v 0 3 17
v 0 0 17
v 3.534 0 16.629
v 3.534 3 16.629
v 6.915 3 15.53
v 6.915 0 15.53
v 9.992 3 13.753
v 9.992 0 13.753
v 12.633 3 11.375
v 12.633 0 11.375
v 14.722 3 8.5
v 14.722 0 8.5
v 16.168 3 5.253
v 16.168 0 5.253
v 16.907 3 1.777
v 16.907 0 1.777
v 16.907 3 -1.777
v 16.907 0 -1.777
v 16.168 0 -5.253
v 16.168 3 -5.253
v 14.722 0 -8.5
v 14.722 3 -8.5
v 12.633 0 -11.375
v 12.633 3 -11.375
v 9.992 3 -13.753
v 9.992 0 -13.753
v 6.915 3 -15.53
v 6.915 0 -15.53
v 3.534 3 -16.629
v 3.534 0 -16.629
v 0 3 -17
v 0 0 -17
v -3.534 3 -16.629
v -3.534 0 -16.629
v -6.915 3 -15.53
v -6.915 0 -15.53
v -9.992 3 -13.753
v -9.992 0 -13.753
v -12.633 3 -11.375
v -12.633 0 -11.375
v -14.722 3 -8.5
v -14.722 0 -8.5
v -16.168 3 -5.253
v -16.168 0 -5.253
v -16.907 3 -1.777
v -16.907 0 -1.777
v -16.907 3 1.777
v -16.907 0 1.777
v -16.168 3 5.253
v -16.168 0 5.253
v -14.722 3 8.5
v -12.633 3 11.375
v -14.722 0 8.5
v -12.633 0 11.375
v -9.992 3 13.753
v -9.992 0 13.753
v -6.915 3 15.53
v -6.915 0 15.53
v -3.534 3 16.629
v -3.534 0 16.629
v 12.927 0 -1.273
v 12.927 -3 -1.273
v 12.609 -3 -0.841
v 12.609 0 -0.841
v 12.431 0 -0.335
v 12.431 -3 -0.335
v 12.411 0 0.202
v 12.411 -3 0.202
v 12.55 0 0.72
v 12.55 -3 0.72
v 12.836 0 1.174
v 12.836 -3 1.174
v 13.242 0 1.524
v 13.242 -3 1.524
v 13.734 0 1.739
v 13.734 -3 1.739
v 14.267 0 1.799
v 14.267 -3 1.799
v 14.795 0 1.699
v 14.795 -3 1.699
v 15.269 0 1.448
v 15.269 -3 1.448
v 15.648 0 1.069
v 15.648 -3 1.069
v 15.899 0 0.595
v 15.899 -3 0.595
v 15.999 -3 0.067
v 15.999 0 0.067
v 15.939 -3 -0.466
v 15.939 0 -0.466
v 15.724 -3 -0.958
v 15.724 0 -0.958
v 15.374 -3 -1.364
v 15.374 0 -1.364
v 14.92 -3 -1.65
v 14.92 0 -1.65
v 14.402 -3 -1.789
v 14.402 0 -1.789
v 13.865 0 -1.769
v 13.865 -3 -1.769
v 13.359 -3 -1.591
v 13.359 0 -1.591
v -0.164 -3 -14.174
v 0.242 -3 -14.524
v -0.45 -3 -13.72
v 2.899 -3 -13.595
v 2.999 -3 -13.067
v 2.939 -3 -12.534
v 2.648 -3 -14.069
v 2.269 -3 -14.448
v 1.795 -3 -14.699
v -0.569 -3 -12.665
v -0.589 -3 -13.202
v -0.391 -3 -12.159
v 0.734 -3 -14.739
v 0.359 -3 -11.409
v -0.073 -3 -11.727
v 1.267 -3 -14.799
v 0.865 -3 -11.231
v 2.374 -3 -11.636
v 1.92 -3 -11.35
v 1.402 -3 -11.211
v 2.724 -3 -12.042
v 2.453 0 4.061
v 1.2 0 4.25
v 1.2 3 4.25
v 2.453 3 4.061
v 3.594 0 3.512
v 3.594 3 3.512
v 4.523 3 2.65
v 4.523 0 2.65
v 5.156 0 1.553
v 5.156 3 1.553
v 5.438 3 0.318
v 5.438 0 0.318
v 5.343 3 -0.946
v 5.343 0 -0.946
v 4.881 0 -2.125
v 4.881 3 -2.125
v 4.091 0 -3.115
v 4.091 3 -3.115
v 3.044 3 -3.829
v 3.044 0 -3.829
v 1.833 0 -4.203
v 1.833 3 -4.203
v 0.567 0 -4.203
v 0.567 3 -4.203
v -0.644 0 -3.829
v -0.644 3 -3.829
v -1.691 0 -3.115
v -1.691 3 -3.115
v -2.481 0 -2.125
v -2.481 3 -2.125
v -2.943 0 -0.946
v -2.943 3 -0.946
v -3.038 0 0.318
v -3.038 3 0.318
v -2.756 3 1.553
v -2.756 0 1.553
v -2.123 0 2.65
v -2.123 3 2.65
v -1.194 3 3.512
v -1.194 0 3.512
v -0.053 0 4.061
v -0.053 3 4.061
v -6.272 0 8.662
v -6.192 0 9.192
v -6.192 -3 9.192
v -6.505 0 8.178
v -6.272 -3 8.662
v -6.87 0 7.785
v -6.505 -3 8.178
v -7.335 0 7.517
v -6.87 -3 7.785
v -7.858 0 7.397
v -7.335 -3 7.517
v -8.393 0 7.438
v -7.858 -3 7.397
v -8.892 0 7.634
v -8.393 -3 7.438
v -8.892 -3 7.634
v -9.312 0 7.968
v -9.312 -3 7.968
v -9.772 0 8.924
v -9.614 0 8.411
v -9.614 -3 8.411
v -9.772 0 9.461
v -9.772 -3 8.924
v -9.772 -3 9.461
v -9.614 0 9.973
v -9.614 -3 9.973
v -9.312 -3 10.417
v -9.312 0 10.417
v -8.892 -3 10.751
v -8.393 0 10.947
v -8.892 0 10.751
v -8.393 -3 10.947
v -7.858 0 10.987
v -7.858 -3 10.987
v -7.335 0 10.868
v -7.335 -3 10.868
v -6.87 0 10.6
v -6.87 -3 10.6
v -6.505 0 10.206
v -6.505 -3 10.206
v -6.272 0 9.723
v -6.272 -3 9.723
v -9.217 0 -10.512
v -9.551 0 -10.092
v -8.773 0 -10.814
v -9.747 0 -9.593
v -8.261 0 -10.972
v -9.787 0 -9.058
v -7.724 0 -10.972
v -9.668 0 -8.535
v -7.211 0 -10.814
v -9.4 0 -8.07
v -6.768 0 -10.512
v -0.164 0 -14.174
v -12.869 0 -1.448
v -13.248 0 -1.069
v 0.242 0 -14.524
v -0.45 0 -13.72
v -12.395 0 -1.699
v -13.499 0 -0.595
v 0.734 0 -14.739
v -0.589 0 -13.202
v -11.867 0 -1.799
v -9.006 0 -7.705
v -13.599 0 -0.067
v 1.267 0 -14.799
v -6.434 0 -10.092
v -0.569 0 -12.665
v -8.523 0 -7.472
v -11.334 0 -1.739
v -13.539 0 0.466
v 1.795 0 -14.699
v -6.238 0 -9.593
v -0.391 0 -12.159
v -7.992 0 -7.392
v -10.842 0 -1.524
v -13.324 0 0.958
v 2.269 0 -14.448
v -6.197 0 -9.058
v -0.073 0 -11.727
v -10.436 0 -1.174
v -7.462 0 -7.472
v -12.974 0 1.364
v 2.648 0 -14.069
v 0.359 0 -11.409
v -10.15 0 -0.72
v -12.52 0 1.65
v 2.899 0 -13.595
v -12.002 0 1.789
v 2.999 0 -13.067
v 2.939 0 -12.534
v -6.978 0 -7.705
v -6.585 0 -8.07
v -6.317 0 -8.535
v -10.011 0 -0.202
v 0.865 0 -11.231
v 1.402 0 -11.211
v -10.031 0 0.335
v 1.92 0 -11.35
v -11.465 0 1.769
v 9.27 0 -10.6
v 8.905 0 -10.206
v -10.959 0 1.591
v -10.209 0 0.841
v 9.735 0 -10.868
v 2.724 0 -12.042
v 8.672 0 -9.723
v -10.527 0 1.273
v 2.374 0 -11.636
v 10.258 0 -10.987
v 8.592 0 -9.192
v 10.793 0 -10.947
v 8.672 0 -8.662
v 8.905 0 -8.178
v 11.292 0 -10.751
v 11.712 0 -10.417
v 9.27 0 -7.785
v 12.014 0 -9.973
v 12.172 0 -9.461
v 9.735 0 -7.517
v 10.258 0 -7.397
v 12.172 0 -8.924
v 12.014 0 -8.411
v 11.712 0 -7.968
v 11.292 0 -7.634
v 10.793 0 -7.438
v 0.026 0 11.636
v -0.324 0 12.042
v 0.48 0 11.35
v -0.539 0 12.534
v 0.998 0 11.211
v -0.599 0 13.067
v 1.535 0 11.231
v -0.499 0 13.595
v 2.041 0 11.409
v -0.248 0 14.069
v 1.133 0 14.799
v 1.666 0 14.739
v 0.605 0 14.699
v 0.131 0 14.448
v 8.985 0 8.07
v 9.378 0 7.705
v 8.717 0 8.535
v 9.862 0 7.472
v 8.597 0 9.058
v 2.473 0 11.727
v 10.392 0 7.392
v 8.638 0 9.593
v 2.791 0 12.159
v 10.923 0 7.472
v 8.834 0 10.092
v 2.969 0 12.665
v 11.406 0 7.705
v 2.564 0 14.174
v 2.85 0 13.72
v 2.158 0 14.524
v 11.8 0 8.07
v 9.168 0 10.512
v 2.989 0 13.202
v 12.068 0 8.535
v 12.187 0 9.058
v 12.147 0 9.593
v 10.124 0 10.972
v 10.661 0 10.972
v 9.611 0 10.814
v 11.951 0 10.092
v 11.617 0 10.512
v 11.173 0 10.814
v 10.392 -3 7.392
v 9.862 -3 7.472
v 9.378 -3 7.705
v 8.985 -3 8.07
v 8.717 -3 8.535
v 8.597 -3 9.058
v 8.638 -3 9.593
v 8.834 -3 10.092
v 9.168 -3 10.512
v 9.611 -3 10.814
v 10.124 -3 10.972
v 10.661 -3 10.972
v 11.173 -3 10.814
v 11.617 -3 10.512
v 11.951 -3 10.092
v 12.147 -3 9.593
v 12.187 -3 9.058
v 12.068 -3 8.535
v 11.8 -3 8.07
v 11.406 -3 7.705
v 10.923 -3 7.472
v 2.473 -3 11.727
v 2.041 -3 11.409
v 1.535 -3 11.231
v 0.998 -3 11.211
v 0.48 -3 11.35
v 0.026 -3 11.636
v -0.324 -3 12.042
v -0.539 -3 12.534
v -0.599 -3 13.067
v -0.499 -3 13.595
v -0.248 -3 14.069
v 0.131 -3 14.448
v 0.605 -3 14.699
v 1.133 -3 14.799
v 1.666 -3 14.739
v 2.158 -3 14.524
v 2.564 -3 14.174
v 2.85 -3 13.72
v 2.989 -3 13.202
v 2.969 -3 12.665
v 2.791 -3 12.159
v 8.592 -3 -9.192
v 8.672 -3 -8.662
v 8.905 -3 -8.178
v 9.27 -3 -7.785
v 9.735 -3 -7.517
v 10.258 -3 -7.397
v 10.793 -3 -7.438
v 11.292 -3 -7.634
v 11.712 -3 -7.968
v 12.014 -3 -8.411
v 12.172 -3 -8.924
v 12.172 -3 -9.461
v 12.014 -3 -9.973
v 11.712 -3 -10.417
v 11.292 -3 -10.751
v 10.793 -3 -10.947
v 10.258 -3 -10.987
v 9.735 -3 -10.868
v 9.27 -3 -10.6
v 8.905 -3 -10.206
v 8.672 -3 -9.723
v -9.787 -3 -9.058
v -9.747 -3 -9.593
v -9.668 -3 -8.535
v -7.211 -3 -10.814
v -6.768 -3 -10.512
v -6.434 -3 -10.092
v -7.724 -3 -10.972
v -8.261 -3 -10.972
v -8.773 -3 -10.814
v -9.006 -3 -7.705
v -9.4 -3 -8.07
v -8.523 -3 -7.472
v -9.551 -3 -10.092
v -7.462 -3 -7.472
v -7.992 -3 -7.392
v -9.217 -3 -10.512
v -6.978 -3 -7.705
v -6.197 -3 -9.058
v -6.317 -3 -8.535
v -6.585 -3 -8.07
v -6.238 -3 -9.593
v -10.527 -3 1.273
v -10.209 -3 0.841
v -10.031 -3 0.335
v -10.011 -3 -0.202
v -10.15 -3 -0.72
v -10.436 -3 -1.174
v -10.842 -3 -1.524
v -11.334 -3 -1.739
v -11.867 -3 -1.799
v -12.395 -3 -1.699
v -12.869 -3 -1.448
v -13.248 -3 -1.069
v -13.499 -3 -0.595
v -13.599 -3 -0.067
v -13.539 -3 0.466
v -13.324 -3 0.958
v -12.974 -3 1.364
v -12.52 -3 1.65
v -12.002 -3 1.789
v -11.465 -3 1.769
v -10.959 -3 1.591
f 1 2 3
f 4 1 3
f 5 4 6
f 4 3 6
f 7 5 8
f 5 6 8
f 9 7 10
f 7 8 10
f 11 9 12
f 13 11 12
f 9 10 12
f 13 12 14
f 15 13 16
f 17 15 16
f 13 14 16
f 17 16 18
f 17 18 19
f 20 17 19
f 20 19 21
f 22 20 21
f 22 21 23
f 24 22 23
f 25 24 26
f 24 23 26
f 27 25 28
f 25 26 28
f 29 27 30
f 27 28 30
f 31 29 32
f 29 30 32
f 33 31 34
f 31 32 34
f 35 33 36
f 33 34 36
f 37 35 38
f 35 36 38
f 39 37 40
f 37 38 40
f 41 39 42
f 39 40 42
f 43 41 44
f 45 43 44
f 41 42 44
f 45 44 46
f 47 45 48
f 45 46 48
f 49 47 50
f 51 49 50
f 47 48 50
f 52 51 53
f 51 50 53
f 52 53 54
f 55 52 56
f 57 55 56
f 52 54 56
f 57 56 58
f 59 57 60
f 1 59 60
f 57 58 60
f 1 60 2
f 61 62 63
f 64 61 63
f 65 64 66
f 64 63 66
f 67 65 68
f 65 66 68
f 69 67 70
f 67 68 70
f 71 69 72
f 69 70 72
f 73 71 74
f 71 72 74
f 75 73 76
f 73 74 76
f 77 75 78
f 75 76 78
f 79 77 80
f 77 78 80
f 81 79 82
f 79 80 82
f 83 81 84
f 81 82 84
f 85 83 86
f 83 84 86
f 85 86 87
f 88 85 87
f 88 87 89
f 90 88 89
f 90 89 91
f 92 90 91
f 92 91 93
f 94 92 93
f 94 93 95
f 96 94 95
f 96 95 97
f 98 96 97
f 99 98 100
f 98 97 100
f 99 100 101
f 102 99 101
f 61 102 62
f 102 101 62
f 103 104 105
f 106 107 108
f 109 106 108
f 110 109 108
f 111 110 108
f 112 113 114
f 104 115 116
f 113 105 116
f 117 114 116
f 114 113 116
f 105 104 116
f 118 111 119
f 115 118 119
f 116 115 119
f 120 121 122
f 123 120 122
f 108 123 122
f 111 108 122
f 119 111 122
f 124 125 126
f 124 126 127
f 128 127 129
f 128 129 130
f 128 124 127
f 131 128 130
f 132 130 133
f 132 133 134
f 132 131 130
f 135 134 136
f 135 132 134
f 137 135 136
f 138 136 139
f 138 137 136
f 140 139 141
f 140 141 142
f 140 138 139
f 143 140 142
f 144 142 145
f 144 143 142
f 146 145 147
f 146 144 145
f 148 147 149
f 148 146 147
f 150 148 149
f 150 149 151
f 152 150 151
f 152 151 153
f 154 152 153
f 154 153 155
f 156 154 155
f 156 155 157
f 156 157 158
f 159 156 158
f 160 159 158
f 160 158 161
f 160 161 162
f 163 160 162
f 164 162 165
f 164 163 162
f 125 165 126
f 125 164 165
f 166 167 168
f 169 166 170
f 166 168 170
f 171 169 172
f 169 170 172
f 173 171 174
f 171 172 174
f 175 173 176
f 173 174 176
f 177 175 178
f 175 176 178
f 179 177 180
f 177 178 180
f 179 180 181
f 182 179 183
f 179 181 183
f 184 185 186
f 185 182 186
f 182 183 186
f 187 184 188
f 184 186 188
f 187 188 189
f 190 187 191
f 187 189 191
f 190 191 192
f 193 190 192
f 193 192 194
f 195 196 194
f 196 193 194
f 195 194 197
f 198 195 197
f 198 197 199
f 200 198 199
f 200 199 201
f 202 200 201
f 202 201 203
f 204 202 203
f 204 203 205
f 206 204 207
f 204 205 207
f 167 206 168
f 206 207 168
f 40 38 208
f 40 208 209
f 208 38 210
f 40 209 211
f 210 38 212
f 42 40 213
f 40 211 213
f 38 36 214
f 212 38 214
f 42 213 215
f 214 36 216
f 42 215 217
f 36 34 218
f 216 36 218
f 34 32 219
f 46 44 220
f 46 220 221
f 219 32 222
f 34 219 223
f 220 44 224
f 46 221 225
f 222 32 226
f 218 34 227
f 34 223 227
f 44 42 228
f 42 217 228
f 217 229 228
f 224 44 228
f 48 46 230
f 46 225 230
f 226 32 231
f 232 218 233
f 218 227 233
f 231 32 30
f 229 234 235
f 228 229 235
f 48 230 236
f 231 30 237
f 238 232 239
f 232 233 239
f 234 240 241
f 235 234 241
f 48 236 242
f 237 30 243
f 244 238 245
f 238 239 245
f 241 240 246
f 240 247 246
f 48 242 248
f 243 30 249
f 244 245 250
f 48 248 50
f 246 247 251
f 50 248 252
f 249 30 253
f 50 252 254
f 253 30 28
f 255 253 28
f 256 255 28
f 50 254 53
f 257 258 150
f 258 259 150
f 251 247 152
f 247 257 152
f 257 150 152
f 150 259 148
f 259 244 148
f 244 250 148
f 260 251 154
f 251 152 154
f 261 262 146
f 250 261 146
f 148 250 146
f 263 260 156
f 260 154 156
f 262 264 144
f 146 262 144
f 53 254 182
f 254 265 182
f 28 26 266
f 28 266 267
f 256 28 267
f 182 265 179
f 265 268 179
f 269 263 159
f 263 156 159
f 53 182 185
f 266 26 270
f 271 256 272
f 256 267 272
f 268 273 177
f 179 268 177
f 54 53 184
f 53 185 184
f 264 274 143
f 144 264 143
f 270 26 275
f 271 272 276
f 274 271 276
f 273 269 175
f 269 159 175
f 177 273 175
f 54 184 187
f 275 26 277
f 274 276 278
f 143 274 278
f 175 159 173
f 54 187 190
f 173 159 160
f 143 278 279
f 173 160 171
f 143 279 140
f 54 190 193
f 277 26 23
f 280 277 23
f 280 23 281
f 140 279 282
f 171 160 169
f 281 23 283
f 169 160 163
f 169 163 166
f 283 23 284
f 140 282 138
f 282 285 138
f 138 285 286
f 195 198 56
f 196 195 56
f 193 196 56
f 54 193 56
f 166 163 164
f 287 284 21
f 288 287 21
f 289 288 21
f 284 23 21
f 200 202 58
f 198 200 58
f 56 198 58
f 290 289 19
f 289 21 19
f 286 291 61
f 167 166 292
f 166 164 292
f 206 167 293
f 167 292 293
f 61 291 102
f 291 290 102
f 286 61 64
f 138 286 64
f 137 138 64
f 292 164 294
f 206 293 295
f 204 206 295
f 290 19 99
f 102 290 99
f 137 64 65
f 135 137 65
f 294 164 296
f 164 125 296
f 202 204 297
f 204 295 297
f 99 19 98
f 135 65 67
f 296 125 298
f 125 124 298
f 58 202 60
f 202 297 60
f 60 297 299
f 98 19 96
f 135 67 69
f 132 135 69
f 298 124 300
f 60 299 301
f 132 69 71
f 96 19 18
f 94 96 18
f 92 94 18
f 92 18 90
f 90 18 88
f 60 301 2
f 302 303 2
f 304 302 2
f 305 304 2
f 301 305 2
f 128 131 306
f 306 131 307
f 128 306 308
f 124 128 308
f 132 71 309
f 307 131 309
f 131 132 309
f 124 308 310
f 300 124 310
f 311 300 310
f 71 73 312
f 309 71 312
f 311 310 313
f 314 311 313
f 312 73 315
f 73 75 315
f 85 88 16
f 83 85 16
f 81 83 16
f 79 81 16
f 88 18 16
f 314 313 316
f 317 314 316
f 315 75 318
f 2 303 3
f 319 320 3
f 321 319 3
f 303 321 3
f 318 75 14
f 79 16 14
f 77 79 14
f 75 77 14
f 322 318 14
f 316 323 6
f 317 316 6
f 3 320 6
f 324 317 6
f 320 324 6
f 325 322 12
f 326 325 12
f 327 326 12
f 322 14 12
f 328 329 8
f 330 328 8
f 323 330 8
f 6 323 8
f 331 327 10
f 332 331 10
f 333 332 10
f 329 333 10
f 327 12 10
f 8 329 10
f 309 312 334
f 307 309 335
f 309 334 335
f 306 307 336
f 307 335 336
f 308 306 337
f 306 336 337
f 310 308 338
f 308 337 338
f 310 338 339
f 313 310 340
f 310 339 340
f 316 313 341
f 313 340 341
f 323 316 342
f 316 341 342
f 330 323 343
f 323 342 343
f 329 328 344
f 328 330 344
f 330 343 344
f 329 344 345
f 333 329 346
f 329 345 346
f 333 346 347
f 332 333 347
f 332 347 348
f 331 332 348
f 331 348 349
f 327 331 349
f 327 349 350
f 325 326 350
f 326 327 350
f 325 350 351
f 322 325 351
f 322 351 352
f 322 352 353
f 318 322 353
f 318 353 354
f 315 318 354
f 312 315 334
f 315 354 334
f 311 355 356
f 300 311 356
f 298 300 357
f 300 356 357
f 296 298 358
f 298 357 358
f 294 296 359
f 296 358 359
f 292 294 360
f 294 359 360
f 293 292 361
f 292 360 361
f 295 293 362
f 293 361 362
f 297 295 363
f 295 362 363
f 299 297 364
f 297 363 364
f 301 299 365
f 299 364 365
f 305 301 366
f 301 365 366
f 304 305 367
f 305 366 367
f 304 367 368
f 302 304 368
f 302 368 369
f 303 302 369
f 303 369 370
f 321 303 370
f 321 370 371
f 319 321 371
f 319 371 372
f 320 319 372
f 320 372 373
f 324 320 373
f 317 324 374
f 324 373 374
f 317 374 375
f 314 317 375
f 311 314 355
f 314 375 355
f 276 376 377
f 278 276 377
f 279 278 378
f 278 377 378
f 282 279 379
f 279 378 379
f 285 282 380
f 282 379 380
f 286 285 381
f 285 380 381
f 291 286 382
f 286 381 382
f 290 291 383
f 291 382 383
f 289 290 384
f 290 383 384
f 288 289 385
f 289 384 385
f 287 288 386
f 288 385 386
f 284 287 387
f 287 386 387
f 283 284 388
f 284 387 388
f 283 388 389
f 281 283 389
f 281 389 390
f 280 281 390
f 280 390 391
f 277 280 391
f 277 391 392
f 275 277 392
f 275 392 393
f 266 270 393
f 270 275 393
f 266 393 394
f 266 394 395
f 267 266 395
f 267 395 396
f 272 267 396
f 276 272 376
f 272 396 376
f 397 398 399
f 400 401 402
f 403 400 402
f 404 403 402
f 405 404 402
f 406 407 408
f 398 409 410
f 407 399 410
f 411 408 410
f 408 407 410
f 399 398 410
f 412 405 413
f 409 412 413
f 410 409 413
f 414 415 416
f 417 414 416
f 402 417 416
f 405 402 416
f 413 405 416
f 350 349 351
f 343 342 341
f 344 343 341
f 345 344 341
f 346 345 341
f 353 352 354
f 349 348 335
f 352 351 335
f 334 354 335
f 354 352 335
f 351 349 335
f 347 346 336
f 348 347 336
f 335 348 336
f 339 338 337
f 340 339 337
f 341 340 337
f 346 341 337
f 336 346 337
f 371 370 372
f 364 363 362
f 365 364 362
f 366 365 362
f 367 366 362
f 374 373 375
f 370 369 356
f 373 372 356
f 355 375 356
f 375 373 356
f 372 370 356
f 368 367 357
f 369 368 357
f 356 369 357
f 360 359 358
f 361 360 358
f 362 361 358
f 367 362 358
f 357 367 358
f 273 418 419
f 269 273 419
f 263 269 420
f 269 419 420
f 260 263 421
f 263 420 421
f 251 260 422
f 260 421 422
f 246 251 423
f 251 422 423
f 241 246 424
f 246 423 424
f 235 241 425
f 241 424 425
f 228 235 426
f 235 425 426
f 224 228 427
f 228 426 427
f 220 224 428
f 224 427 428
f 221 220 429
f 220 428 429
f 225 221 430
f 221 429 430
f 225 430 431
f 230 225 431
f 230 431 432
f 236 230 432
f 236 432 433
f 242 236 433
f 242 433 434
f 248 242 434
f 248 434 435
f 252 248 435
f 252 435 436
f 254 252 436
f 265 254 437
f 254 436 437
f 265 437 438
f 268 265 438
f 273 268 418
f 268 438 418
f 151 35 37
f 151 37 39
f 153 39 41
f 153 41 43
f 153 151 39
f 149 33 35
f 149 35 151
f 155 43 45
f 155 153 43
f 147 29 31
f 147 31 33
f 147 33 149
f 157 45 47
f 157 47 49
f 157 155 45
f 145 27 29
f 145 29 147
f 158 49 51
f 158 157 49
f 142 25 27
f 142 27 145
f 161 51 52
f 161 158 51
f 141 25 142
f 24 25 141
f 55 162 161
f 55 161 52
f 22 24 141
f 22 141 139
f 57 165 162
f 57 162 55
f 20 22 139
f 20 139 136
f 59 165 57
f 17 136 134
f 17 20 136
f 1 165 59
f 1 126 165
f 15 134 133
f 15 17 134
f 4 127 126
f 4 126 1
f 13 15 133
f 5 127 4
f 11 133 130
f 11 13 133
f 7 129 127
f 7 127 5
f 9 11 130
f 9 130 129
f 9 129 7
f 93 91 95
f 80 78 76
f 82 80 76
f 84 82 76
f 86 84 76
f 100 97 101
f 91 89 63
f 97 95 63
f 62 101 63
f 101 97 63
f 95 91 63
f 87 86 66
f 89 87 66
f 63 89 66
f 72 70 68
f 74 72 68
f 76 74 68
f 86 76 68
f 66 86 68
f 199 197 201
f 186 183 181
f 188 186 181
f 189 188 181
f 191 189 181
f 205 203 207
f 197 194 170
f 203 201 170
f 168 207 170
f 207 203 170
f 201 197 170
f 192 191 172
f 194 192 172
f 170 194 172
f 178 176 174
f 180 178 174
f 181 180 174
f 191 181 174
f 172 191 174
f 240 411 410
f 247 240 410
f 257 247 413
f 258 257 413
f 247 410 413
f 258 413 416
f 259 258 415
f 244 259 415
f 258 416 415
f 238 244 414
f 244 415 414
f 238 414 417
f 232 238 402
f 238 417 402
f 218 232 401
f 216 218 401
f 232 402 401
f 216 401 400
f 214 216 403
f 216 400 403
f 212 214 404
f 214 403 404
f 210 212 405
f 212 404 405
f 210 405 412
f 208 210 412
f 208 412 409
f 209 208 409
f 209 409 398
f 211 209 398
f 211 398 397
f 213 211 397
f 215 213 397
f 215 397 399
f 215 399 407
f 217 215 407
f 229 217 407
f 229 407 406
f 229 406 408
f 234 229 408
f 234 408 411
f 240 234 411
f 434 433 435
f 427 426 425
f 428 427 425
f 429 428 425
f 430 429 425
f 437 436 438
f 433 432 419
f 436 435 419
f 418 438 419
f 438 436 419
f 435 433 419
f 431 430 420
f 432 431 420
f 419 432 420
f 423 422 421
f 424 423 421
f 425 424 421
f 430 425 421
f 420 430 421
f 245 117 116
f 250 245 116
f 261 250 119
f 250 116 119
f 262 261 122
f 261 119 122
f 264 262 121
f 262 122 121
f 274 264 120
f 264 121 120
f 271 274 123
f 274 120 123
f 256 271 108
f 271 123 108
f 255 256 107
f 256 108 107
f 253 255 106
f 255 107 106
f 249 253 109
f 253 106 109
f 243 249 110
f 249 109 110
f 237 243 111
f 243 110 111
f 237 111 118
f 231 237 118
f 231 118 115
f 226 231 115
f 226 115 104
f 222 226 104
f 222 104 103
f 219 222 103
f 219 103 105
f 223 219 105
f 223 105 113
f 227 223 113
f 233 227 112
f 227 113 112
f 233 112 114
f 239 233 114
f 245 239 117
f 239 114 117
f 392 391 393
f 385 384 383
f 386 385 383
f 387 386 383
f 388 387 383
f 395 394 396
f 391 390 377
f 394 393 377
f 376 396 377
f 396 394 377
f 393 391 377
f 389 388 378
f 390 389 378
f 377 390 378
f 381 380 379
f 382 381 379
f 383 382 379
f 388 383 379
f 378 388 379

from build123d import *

# Parameters (mm, degrees)
SKETCH1_R           = 17
SKETCH1_R_2         = 1.8
SKETCH1_R_3         = 4.25
BOSS_EXTRUDE2_DEPTH = 3
BOSS_EXTRUDE4_START = -6
SKETCH2_R           = 1.8
BOSS_EXTRUDE4_DEPTH = 6
CIRPATTERN1_COUNT   = 8


with BuildPart() as part:
    # Sketch1 → Boss-Extrude2 (new body)
    with BuildSketch(Plane(origin=(0, 0, 0), x_dir=(1, 0, 0), z_dir=(0, 1, 0))):
        with Locations(Location((0, 0, 0), (0, 0, 270))):
            Circle(SKETCH1_R)
        with Locations(Location((-7.992388155, 9.192388155, 0), (0, 0, 270))):
            Circle(SKETCH1_R_2, mode=Mode.SUBTRACT)
        with Locations(Location((1.2, 0, 0), (0, 0, 270))):
            Circle(SKETCH1_R_3, mode=Mode.SUBTRACT)
        with Locations(Location((1.2, 13, 0), (0, 0, 270))):
            Circle(SKETCH1_R_2, mode=Mode.SUBTRACT)
        with Locations(Location((10.392388155, 9.192388155, 0), (0, 0, 270))):
            Circle(SKETCH1_R_2, mode=Mode.SUBTRACT)
        with Locations(Location((14.2, 0, 0), (0, 0, 270))):
            Circle(SKETCH1_R_2, mode=Mode.SUBTRACT)
        with Locations(Location((10.392388155, -9.192388155, 0), (0, 0, 270))):
            Circle(SKETCH1_R_2, mode=Mode.SUBTRACT)
        with Locations(Location((1.2, -13, 0), (0, 0, 270))):
            Circle(SKETCH1_R_2, mode=Mode.SUBTRACT)
        with Locations(Location((-7.992388155, -9.192388155, 0), (0, 0, 270))):
            Circle(SKETCH1_R_2, mode=Mode.SUBTRACT)
        with Locations(Location((-11.8, 0, 0), (0, 0, 270))):
            Circle(SKETCH1_R_2, mode=Mode.SUBTRACT)
    extrude(amount=BOSS_EXTRUDE2_DEPTH)

    # Sketch2 → Boss-Extrude4 (add)
    with BuildSketch(Plane(origin=(0, 3, 0), x_dir=(1, 0, 0), z_dir=(0, 1, 0)).offset(BOSS_EXTRUDE4_START)):
        with Locations(Location((-7.992388155, 9.192388155, 0), (0, 0, 270))):
            Circle(SKETCH2_R)
    boss_extrude4 = extrude(amount=BOSS_EXTRUDE4_DEPTH)

    # CirPattern1: Boss-Extrude4 ×8 about axis
    cirpattern1_axis = Axis((1.2, 0, 0), (0, 1, 0))
    for i in range(1, CIRPATTERN1_COUNT):
        add(boss_extrude4.rotate(cirpattern1_axis, i * 360 / CIRPATTERN1_COUNT))


solid = part.part
